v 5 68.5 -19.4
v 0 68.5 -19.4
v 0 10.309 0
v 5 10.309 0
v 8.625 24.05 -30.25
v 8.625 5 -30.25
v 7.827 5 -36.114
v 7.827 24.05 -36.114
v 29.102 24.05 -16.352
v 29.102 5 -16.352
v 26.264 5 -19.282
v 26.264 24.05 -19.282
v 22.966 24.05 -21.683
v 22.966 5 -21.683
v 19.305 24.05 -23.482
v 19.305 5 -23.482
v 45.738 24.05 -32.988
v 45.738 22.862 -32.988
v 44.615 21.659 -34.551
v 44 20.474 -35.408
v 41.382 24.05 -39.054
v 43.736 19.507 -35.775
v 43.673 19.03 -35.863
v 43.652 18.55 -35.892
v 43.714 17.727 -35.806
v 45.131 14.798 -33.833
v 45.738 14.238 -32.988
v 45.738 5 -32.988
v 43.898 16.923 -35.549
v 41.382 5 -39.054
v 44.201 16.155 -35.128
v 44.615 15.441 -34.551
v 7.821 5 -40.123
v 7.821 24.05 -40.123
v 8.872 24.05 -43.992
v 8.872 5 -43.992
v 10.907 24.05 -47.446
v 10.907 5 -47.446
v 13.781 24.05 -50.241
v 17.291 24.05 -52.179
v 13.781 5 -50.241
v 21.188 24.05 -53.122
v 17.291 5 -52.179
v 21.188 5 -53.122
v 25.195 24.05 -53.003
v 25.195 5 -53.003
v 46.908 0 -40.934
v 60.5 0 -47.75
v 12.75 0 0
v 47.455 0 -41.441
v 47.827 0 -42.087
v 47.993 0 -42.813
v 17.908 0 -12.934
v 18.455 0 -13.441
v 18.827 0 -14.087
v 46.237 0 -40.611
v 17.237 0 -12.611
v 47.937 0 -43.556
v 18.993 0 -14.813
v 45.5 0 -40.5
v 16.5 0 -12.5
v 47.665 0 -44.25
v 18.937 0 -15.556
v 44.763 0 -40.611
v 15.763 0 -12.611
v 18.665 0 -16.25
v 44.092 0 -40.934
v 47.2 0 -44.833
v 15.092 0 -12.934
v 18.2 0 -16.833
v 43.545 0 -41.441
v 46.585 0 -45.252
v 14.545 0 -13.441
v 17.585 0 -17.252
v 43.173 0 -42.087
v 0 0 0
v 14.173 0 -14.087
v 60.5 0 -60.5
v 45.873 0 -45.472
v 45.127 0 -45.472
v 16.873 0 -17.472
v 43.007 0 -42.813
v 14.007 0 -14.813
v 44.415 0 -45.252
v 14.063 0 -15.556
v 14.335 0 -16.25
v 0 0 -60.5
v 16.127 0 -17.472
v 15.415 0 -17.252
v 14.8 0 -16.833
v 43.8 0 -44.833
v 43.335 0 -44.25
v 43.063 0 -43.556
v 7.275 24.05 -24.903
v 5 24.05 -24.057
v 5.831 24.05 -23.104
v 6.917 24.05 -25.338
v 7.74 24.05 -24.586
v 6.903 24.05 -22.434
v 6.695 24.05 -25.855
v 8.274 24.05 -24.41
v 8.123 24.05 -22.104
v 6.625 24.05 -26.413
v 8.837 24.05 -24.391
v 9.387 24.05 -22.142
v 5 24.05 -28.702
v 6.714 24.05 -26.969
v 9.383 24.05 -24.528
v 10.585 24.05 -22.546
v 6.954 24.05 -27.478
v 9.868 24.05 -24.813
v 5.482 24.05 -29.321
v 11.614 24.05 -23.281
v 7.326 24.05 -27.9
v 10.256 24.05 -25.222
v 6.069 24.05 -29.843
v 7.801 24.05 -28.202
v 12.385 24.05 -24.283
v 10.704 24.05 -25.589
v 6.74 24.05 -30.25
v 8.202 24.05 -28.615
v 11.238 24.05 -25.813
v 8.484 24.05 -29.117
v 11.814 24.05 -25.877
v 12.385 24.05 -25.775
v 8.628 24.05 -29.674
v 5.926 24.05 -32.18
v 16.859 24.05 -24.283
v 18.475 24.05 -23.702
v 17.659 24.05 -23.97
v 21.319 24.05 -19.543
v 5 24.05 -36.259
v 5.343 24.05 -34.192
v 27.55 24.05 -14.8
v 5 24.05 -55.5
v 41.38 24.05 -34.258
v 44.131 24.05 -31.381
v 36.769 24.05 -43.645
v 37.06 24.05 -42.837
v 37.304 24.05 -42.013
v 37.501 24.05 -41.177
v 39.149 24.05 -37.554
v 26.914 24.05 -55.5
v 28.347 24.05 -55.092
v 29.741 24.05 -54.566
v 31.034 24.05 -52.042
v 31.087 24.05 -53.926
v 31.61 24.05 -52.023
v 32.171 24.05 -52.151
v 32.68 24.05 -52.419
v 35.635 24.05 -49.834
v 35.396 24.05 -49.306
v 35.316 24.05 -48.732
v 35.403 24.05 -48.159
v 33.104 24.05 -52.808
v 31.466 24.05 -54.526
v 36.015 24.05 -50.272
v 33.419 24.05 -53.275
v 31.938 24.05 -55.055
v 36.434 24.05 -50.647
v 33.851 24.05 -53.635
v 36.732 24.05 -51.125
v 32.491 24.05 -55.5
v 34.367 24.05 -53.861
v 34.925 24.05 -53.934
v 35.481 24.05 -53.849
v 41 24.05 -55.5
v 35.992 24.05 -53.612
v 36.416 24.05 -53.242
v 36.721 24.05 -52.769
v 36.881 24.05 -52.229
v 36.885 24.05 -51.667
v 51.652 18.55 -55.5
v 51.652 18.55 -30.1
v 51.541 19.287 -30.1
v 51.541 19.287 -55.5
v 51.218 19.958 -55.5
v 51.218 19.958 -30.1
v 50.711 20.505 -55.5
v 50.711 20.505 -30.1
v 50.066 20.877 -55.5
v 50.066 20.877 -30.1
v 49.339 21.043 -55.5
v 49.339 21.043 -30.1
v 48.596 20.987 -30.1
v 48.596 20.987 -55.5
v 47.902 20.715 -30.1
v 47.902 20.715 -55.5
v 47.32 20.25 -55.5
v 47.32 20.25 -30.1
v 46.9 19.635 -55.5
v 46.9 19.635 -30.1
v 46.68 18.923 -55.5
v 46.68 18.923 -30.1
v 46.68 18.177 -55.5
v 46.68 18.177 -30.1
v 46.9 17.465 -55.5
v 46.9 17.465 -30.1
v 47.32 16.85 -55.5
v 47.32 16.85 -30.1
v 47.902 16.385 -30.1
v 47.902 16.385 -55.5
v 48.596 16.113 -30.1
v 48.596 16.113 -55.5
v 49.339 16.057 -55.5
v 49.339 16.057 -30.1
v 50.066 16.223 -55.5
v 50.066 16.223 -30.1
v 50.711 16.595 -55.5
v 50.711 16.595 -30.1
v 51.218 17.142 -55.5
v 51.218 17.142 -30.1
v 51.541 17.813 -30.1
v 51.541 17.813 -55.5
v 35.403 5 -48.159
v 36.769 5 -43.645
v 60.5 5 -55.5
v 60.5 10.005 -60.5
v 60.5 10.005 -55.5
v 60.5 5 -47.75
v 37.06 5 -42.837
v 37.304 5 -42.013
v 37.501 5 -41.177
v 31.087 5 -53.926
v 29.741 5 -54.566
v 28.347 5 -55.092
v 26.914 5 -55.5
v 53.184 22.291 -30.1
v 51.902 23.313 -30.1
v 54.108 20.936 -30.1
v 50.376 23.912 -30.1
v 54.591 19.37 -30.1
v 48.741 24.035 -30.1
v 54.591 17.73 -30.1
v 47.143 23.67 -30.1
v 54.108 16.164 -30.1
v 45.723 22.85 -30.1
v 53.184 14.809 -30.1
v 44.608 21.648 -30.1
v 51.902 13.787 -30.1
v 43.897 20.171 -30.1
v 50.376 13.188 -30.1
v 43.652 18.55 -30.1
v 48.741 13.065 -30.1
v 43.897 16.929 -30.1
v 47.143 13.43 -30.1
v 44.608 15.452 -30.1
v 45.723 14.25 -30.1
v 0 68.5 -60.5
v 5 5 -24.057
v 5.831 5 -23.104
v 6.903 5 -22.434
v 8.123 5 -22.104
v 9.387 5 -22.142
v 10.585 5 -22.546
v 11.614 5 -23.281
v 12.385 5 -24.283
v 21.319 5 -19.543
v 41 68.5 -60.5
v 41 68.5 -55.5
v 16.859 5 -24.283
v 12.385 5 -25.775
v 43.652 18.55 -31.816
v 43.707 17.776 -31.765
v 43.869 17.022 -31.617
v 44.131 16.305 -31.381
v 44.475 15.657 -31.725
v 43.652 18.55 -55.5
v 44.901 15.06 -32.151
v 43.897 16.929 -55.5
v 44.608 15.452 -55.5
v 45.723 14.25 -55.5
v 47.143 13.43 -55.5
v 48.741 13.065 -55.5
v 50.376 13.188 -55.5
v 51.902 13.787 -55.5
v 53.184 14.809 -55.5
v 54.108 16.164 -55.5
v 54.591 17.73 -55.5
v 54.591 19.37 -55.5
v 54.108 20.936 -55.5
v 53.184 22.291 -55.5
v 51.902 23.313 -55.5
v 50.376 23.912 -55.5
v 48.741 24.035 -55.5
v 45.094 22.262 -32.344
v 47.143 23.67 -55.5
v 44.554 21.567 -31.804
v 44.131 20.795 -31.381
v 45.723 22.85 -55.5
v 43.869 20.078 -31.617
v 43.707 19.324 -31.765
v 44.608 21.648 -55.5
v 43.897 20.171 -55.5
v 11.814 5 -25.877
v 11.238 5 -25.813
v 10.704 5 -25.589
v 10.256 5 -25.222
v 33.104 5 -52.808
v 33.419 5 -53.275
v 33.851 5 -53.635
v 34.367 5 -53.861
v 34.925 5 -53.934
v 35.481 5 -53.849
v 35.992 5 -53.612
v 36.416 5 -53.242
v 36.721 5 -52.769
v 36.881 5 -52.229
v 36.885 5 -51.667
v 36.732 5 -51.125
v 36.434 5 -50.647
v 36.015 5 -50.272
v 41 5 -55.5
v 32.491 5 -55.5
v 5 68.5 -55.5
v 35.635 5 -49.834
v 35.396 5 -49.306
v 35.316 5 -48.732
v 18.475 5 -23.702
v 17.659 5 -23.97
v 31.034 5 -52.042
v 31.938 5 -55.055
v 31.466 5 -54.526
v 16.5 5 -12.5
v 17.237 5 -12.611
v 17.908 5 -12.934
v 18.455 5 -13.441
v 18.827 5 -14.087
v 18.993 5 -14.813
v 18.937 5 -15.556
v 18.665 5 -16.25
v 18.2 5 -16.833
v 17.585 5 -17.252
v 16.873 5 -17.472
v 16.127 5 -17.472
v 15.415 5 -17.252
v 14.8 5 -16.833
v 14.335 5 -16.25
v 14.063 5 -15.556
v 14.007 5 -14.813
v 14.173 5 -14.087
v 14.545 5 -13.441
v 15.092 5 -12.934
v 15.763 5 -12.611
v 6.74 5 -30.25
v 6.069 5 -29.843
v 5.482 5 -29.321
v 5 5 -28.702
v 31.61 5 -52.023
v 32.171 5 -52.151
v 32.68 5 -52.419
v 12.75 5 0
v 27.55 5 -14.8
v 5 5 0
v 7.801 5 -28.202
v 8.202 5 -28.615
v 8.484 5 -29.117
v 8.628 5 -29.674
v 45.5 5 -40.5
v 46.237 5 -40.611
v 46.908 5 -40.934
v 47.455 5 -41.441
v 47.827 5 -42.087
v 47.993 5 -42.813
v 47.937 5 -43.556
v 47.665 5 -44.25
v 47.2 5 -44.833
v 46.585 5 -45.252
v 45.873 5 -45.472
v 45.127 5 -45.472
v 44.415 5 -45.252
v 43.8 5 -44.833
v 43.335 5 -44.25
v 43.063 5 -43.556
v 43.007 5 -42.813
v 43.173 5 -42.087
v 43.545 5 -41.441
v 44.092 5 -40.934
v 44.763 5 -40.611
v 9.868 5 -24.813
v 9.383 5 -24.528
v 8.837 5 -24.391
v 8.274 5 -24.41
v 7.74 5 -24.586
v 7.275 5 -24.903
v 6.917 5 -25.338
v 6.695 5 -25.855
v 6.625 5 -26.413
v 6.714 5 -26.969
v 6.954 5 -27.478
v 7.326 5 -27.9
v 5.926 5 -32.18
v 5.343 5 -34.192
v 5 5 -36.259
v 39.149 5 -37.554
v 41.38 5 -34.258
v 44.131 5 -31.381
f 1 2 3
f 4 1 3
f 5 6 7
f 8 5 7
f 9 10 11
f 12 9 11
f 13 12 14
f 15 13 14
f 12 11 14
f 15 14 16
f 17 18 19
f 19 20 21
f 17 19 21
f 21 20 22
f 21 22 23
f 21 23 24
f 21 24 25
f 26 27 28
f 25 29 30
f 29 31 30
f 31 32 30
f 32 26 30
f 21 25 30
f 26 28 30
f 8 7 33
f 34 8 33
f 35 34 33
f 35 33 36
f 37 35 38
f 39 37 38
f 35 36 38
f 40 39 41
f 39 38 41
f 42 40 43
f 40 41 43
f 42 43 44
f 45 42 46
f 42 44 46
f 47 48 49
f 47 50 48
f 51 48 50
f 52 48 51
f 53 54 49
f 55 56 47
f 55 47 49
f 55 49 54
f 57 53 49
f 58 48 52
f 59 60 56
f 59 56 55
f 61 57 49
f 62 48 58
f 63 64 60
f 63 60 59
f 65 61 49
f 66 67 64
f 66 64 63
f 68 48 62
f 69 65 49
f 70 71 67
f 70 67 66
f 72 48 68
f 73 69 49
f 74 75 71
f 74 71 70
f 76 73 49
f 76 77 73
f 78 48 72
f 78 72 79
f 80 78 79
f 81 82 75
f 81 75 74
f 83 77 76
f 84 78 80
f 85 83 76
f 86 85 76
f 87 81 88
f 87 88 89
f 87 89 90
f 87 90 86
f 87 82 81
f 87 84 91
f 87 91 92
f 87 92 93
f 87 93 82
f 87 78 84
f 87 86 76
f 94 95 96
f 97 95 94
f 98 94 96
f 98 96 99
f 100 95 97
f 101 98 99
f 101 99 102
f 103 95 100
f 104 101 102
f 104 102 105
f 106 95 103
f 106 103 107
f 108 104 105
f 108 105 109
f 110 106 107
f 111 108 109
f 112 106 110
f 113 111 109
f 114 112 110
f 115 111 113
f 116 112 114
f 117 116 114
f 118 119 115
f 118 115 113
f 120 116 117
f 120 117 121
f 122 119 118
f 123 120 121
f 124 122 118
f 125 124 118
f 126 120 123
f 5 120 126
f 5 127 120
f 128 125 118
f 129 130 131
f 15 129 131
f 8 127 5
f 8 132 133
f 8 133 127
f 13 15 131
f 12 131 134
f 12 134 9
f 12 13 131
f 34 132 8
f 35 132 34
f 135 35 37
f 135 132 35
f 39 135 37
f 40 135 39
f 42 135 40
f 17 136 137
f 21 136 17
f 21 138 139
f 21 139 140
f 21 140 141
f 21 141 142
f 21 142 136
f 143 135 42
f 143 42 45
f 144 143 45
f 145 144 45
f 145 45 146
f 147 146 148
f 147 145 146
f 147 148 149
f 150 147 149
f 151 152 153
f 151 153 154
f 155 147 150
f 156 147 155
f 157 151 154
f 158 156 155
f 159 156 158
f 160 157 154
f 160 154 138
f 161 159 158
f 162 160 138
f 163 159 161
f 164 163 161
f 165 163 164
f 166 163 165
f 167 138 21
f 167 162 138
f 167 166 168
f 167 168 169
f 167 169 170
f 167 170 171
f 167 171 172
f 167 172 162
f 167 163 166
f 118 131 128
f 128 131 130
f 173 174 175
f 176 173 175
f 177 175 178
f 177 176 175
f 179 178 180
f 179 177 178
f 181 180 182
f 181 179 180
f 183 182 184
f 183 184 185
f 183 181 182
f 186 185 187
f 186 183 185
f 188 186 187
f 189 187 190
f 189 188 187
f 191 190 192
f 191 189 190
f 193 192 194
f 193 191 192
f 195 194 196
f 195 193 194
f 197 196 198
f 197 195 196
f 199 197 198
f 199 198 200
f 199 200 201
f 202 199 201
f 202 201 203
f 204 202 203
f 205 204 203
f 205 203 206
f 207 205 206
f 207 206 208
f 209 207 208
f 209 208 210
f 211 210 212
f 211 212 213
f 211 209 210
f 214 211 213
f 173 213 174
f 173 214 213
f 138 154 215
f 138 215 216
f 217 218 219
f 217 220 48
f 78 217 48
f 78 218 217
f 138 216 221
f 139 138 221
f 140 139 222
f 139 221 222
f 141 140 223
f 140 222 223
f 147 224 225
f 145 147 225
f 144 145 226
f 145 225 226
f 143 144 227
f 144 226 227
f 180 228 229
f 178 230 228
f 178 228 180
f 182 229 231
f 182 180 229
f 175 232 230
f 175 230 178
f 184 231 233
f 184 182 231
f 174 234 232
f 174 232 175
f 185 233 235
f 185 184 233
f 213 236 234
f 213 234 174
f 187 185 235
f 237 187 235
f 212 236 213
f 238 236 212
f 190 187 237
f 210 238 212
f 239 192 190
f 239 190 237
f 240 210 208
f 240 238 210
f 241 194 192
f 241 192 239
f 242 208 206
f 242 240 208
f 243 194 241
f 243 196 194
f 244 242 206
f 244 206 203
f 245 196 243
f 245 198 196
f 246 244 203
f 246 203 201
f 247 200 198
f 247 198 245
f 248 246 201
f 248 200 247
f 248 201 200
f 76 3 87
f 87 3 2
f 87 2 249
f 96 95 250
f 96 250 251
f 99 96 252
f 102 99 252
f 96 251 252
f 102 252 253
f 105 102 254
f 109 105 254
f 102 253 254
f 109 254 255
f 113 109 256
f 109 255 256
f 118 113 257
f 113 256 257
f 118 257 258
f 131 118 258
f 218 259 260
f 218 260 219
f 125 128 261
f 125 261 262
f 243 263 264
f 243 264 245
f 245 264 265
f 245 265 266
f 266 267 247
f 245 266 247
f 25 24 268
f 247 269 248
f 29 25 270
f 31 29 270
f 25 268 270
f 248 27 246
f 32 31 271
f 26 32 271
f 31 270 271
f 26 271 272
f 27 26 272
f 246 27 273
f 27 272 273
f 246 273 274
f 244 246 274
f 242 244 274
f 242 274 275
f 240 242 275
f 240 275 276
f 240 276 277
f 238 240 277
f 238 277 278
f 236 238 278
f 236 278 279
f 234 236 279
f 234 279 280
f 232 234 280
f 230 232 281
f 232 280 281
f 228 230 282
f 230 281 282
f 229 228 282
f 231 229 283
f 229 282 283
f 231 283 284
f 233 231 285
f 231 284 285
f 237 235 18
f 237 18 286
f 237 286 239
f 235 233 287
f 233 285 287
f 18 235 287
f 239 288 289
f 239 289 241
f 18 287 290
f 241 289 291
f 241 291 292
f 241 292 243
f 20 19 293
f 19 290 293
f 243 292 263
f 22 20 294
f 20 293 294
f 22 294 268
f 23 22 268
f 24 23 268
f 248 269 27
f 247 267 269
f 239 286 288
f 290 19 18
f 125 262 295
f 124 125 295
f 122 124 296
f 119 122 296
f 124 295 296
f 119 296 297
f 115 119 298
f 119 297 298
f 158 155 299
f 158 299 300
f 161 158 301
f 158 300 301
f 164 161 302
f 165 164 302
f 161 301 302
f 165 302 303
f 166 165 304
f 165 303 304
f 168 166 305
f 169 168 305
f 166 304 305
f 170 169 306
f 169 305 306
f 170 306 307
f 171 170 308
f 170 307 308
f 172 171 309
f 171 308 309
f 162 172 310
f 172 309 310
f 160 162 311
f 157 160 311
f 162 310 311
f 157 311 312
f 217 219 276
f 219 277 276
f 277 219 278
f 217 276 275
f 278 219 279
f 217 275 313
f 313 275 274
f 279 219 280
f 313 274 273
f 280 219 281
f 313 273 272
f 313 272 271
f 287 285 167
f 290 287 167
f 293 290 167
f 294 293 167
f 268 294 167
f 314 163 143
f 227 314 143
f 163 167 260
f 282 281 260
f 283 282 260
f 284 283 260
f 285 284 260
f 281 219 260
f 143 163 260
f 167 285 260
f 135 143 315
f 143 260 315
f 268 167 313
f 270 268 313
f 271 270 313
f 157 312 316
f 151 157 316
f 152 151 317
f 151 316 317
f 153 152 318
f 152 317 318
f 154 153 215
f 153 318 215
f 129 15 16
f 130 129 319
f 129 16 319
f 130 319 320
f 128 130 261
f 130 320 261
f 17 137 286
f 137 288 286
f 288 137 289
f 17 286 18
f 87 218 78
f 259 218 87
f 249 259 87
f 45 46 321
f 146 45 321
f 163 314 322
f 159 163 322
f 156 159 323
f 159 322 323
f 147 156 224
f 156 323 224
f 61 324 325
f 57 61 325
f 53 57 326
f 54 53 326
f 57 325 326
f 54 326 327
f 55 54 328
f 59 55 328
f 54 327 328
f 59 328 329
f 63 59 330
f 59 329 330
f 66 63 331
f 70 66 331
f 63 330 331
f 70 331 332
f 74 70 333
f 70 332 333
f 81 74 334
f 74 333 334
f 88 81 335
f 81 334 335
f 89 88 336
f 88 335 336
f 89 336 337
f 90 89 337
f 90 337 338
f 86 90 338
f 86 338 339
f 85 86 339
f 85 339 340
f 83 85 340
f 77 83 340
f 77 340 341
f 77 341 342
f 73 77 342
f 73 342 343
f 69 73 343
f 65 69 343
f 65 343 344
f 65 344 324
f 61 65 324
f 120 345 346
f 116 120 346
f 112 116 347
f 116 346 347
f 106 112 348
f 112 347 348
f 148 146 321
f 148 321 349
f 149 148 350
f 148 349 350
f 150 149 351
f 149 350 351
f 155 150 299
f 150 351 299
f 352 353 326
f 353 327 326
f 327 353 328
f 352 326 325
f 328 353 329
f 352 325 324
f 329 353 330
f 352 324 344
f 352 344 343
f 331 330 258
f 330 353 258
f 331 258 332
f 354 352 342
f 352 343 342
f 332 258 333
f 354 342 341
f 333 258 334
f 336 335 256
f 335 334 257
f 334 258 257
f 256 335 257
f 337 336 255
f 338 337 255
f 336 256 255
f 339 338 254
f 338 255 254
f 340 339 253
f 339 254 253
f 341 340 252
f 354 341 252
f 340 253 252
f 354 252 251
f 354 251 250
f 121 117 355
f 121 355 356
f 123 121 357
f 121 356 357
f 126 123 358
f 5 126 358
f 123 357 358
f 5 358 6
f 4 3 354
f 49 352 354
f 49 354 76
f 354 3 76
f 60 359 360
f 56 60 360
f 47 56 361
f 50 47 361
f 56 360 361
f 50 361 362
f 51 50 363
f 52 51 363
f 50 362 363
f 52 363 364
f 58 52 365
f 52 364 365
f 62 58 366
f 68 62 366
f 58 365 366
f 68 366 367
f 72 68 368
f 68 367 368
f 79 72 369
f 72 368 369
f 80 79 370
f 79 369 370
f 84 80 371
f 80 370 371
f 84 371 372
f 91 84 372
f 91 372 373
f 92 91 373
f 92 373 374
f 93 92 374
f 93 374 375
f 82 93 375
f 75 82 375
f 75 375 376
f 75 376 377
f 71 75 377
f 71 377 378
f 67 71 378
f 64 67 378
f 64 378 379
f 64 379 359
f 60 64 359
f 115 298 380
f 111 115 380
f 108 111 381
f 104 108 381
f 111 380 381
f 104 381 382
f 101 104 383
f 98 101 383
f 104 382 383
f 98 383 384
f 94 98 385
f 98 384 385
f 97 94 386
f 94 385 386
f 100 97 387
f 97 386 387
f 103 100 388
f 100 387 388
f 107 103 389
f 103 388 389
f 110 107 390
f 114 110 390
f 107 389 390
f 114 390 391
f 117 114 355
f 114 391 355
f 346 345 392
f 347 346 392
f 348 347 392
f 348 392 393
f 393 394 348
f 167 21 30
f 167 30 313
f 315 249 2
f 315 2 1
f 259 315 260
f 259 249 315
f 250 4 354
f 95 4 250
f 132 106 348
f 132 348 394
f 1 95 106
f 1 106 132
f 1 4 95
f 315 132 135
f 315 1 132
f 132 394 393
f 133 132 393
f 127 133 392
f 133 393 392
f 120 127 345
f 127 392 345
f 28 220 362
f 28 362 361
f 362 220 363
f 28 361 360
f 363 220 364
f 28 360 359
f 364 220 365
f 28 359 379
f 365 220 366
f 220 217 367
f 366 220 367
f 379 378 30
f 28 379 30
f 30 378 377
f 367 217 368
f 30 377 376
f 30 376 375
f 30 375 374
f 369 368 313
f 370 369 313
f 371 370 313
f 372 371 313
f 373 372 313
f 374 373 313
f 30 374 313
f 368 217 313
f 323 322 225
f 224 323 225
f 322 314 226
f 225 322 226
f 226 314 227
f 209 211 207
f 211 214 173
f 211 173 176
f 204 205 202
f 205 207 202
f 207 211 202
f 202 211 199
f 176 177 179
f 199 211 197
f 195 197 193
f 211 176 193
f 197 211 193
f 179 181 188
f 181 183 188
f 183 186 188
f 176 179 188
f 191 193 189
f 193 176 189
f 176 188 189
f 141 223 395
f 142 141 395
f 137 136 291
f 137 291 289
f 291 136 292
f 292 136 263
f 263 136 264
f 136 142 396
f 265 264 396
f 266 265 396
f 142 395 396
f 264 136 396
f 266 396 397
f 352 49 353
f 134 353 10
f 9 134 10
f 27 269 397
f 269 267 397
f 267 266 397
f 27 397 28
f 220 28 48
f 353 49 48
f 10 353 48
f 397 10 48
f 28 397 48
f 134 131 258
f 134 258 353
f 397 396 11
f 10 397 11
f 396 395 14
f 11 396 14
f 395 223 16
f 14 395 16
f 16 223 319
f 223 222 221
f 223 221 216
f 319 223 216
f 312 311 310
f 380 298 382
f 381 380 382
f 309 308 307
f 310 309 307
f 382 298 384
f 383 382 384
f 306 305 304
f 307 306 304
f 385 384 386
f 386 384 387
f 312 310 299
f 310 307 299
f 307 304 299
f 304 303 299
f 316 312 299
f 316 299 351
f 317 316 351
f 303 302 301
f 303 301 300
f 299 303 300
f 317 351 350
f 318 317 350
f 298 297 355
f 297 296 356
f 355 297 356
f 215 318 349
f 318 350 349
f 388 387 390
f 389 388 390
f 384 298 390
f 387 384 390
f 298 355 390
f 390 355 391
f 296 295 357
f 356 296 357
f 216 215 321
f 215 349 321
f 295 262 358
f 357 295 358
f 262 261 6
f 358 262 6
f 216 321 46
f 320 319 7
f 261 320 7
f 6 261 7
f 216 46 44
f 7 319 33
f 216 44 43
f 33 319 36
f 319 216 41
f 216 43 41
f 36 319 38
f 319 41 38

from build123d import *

# Parameters (mm, degrees)
BOSS_EXTRUDE1_DEPTH = 5
BOSS_EXTRUDE2_DEPTH = 5
BOSS_EXTRUDE3_DEPTH = 5
SKETCH6_R           = 2.5
CUT_EXTRUDE1_DEPTH  = 107.549284371
BOSS_EXTRUDE4_DEPTH = 19.05
SKETCH9_R           = 5.5
SKETCH9_R_2         = 2.5
BOSS_EXTRUDE5_DEPTH = 25.4


with BuildPart() as part:
    # Sketch1 → Boss-Extrude1 (new body)
    with BuildSketch(Plane(origin=(0, 0, 0), x_dir=(1, 0, 0), z_dir=(0, 1, 0))):
        Polygon((0, 0), (0, 60.5), (60.5, 60.5), (60.5, 47.75), (12.75, 0), align=None)
    extrude(amount=BOSS_EXTRUDE1_DEPTH)

    # Sketch4 → Boss-Extrude2 (add)
    with BuildSketch(Plane.ZY):
        Polygon((-60.5, 5), (-60.5, 68.5), (-19.4, 68.5), (0, 10.308629506), (0, 5), align=None)
    extrude(amount=-BOSS_EXTRUDE2_DEPTH)

    # Sketch5 → Boss-Extrude3 (add)
    with BuildSketch(Plane(origin=(0, 0, -60.5), x_dir=(-1, 0, 0), z_dir=(0, 0, -1))):
        Polygon((-5, 5), (-5, 68.5), (-41, 68.5), (-60.5, 10.004653177), (-60.5, 5), align=None)
    extrude(amount=-BOSS_EXTRUDE3_DEPTH)

    # Sketch6 → Cut-Extrude1 (cut, through all)
    with BuildSketch(Plane(origin=(0, 5, 0), x_dir=(1, 0, 0), z_dir=(0, 1, 0))):
        with Locations(Location((16.5, 15, 0), (0, 0, 270))):
            Circle(SKETCH6_R)
        with Locations(Location((45.5, 43, 0), (0, 0, 270))):
            Circle(SKETCH6_R)
    extrude(amount=-CUT_EXTRUDE1_DEPTH, mode=Mode.SUBTRACT)

    # Sketch7 → Boss-Extrude4 (add)
    with BuildSketch(Plane(origin=(0, 5, 0), x_dir=(1, 0, 0), z_dir=(0, 1, 0))):
        with BuildLine():
            Line((21.319247217, 19.543418849), (27.55028172, 14.80028172))
            Line((27.55028172, 14.80028172), (29.101515101, 16.351515101))
            ThreePointArc((29.101515101, 16.351515101), (24.666913521, 20.553458517), (19.305449591, 23.482062993))
            ThreePointArc((19.305449591, 23.482062993), (18.064972723, 23.830124106), (16.858784616, 24.282937146))
            Line((16.858784616, 24.282937146), (12.384629863, 25.774635894))
            ThreePointArc((12.384629863, 25.774635894), (11.23817984, 25.813438697), (10.255553875, 25.221577628))
            ThreePointArc((10.255553875, 25.221577628), (7.080749695, 25.107920962), (7.801379157, 28.201946269))
            ThreePointArc((7.801379157, 28.201946269), (8.483986824, 29.116932404), (8.624672831, 30.249787338))
            Line((8.624672831, 30.249787338), (7.827322243, 36.113739602))
            ThreePointArc((7.827322243, 36.113739602), (12.250646005, 48.939477405), (25.194853904, 53.00307497))
            Line((25.194853904, 53.00307497), (31.034265028, 52.042355532))
            ThreePointArc((31.034265028, 52.042355532), (32.170605503, 52.151365529), (33.104288638, 52.808167369))
            ThreePointArc((33.104288638, 52.808167369), (36.217223203, 53.44215303), (36.014993038, 50.271758357))
            ThreePointArc((36.014993038, 50.271758357), (35.395934706, 49.306035781), (35.402721719, 48.158949364))
            Line((35.402721719, 48.158949364), (36.768952902, 43.644900376))
            ThreePointArc((36.768952902, 43.644900376), (37.18792138, 42.426542952), (37.501221649, 41.17683405))
            ThreePointArc((37.501221649, 41.17683405), (40.195217667, 35.858711581), (44.131223781, 31.381223781))
            Line((44.131223781, 31.381223781), (45.737755925, 32.987755925))
            Line((45.737755925, 32.987755925), (41.382120343, 39.053882356))
            Line((41.382120343, 39.053882356), (41, 55.5))
            Line((41, 55.5), (32.491282289, 55.5))
            ThreePointArc((32.491282289, 55.5), (31.691168489, 54.800352321), (31.086863185, 53.925993089))
            ThreePointArc((31.086863185, 53.925993089), (29.049863177, 54.843826537), (26.91416103, 55.5))
            Line((26.91416103, 55.5), (5, 55.5))
            Line((5, 55.5), (5, 36.259130968))
            ThreePointArc((5, 36.259130968), (5.604814931, 33.17761818), (6.740301049, 30.249787338))
            ThreePointArc((6.740301049, 30.249787338), (5.763456299, 29.595667883), (5, 28.701669892))
            Line((5, 28.701669892), (5, 24.05684885))
            ThreePointArc((5, 24.05684885), (8.756409057, 22.076412717), (12.384629863, 24.282937146))
            Line((12.384629863, 24.282937146), (21.319247217, 19.543418849))
        make_face()
    extrude(amount=BOSS_EXTRUDE4_DEPTH)

    # Sketch9 → Boss-Extrude5 (add)
    with BuildSketch(Plane.XY.offset(-55.5)):
        with Locations(Location((49.152306284, 18.55, 0), (0, 0, 180))):
            Circle(SKETCH9_R)
        with Locations((49.152306284, 18.55)):
            Circle(SKETCH9_R_2, mode=Mode.SUBTRACT)
    extrude(amount=BOSS_EXTRUDE5_DEPTH)


solid = part.part
